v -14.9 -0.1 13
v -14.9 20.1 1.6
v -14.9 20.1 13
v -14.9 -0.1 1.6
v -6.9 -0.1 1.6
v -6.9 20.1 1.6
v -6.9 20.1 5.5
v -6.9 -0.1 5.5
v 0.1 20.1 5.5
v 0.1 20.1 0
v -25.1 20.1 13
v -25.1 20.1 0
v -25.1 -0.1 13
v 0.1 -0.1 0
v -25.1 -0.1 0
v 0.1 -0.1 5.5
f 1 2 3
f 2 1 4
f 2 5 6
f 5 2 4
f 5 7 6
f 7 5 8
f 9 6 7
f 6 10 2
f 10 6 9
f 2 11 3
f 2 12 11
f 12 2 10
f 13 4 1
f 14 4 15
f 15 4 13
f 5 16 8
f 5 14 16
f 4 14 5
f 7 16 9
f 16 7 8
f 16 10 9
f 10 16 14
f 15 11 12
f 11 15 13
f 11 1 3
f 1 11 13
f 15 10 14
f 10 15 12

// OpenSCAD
// =====================================================================
//  Korek narożny pod drzwi prysznicowe – bryła + 2 regulowane wycięcia
//  Układ: A = (0,0) kąt prosty, AB wzdłuż X, AC wzdłuż Y, Z w górę
// =====================================================================

// ---------------- BRYŁA ----------------
a = 25;   // długość krawędzi AB (oś X) [mm]
b = 20;   // długość krawędzi AC (oś Y) [mm]
H = 13;    // wysokość nad krawędzią AB [mm]

// ---------------- PODGLĄD ----------------
pokaz_wyciecia = true;  // true = wycięcia podświetlone na różowo w podglądzie (F5)
                        // w renderze (F6) i eksporcie STL podświetlenie znika
luz = 0.2;              // tolerancja dodawana do szerokości i długości wycięć [mm]

// ---------------- WYCIĘCIE 1: szyba wchodząca od góry ----------------
w1_wlaczone = true;
w1_poz   = [7, 0, 1.6];      // [x, y, z] dolnego narożnika wycięcia
                            //   x = odległość od krawędzi AC
                            //   z = dno szczeliny (H - z = głębokość wejścia szyby)
w1_wym   = [7.8, b , 20];  // [grubość szyby, długość, wysokość]
                            //   długość i wysokość celowo "na zapas" poza bryłę
w1_obrot = 0;               // obrót wokół osi Z względem narożnika [°]

// -- wyciecie 3 na koło
w3_wlaczone = true;
w3_poz   = [0, 0, 5.5];      // [x, y, z] dolnego narożnika wycięcia
                            //   x = odległość od krawędzi AC
                            //   z = dno szczeliny (H - z = głębokość wejścia szyby)
w3_wym   = [7.8, b, 20];  // [grubość szyby, długość, wysokość]
                            //   długość i wysokość celowo "na zapas" poza bryłę
w3_obrot = 0;               // obrót wokół osi Z względem narożnika [°]


// ---------------- NADLOZENIA ----------------

// n1 - wydluzenie do srodka wneki
n1_wlaczone = true;
n1_poz   = [0, 0, 0];      // [x, y, z] dolnego narożnika wycięcia
                            //   x = odległość od krawędzi AC
                            //   z = dno szczeliny (H - z = głębokość wejścia szyby)
n1_wym   = [a, b, H];  // [grubość szyby, długość, wysokość]
                            //   długość i wysokość celowo "na zapas" poza bryłę
n1_obrot = 0;               // obrót wokół osi Z względem narożnika [°]


// =====================================================================

// Prostopadłościan powiększony o luz w X i Y (symetrycznie), bez zmiany Z
module wyciecie(poz, wym, obrot) {
    translate(poz)
        rotate([0, 0, obrot])
            translate([-luz/2, -luz/2, 0])
                cube(wym + [luz, luz, 0]);
}

module wyciecia() {
    if (w1_wlaczone) wyciecie(w1_poz, w1_wym, w1_obrot);
    if (w3_wlaczone) wyciecie(w3_poz, w3_wym, w3_obrot);
}



// ---------------- ODBICIE LUSTRZANE ----------------
lustro     = true;      // true = odbij całość (bryłę razem z wycięciami)
lustro_os  = [1, 0, 0]; // [1,0,0] = lewo-prawo (odbicie względem płaszczyzny YZ)
                        // [0,1,0] = przód-tył (względem płaszczyzny XZ)

module calosc() {
    union() {
    difference() {
        if (n1_wlaczone) wyciecie(n1_poz, n1_wym, n1_obrot);

        if (pokaz_wyciecia) #wyciecia();
        else                 wyciecia();
    }

    }
}

if (lustro) mirror(lustro_os) calosc();
else        calosc();
